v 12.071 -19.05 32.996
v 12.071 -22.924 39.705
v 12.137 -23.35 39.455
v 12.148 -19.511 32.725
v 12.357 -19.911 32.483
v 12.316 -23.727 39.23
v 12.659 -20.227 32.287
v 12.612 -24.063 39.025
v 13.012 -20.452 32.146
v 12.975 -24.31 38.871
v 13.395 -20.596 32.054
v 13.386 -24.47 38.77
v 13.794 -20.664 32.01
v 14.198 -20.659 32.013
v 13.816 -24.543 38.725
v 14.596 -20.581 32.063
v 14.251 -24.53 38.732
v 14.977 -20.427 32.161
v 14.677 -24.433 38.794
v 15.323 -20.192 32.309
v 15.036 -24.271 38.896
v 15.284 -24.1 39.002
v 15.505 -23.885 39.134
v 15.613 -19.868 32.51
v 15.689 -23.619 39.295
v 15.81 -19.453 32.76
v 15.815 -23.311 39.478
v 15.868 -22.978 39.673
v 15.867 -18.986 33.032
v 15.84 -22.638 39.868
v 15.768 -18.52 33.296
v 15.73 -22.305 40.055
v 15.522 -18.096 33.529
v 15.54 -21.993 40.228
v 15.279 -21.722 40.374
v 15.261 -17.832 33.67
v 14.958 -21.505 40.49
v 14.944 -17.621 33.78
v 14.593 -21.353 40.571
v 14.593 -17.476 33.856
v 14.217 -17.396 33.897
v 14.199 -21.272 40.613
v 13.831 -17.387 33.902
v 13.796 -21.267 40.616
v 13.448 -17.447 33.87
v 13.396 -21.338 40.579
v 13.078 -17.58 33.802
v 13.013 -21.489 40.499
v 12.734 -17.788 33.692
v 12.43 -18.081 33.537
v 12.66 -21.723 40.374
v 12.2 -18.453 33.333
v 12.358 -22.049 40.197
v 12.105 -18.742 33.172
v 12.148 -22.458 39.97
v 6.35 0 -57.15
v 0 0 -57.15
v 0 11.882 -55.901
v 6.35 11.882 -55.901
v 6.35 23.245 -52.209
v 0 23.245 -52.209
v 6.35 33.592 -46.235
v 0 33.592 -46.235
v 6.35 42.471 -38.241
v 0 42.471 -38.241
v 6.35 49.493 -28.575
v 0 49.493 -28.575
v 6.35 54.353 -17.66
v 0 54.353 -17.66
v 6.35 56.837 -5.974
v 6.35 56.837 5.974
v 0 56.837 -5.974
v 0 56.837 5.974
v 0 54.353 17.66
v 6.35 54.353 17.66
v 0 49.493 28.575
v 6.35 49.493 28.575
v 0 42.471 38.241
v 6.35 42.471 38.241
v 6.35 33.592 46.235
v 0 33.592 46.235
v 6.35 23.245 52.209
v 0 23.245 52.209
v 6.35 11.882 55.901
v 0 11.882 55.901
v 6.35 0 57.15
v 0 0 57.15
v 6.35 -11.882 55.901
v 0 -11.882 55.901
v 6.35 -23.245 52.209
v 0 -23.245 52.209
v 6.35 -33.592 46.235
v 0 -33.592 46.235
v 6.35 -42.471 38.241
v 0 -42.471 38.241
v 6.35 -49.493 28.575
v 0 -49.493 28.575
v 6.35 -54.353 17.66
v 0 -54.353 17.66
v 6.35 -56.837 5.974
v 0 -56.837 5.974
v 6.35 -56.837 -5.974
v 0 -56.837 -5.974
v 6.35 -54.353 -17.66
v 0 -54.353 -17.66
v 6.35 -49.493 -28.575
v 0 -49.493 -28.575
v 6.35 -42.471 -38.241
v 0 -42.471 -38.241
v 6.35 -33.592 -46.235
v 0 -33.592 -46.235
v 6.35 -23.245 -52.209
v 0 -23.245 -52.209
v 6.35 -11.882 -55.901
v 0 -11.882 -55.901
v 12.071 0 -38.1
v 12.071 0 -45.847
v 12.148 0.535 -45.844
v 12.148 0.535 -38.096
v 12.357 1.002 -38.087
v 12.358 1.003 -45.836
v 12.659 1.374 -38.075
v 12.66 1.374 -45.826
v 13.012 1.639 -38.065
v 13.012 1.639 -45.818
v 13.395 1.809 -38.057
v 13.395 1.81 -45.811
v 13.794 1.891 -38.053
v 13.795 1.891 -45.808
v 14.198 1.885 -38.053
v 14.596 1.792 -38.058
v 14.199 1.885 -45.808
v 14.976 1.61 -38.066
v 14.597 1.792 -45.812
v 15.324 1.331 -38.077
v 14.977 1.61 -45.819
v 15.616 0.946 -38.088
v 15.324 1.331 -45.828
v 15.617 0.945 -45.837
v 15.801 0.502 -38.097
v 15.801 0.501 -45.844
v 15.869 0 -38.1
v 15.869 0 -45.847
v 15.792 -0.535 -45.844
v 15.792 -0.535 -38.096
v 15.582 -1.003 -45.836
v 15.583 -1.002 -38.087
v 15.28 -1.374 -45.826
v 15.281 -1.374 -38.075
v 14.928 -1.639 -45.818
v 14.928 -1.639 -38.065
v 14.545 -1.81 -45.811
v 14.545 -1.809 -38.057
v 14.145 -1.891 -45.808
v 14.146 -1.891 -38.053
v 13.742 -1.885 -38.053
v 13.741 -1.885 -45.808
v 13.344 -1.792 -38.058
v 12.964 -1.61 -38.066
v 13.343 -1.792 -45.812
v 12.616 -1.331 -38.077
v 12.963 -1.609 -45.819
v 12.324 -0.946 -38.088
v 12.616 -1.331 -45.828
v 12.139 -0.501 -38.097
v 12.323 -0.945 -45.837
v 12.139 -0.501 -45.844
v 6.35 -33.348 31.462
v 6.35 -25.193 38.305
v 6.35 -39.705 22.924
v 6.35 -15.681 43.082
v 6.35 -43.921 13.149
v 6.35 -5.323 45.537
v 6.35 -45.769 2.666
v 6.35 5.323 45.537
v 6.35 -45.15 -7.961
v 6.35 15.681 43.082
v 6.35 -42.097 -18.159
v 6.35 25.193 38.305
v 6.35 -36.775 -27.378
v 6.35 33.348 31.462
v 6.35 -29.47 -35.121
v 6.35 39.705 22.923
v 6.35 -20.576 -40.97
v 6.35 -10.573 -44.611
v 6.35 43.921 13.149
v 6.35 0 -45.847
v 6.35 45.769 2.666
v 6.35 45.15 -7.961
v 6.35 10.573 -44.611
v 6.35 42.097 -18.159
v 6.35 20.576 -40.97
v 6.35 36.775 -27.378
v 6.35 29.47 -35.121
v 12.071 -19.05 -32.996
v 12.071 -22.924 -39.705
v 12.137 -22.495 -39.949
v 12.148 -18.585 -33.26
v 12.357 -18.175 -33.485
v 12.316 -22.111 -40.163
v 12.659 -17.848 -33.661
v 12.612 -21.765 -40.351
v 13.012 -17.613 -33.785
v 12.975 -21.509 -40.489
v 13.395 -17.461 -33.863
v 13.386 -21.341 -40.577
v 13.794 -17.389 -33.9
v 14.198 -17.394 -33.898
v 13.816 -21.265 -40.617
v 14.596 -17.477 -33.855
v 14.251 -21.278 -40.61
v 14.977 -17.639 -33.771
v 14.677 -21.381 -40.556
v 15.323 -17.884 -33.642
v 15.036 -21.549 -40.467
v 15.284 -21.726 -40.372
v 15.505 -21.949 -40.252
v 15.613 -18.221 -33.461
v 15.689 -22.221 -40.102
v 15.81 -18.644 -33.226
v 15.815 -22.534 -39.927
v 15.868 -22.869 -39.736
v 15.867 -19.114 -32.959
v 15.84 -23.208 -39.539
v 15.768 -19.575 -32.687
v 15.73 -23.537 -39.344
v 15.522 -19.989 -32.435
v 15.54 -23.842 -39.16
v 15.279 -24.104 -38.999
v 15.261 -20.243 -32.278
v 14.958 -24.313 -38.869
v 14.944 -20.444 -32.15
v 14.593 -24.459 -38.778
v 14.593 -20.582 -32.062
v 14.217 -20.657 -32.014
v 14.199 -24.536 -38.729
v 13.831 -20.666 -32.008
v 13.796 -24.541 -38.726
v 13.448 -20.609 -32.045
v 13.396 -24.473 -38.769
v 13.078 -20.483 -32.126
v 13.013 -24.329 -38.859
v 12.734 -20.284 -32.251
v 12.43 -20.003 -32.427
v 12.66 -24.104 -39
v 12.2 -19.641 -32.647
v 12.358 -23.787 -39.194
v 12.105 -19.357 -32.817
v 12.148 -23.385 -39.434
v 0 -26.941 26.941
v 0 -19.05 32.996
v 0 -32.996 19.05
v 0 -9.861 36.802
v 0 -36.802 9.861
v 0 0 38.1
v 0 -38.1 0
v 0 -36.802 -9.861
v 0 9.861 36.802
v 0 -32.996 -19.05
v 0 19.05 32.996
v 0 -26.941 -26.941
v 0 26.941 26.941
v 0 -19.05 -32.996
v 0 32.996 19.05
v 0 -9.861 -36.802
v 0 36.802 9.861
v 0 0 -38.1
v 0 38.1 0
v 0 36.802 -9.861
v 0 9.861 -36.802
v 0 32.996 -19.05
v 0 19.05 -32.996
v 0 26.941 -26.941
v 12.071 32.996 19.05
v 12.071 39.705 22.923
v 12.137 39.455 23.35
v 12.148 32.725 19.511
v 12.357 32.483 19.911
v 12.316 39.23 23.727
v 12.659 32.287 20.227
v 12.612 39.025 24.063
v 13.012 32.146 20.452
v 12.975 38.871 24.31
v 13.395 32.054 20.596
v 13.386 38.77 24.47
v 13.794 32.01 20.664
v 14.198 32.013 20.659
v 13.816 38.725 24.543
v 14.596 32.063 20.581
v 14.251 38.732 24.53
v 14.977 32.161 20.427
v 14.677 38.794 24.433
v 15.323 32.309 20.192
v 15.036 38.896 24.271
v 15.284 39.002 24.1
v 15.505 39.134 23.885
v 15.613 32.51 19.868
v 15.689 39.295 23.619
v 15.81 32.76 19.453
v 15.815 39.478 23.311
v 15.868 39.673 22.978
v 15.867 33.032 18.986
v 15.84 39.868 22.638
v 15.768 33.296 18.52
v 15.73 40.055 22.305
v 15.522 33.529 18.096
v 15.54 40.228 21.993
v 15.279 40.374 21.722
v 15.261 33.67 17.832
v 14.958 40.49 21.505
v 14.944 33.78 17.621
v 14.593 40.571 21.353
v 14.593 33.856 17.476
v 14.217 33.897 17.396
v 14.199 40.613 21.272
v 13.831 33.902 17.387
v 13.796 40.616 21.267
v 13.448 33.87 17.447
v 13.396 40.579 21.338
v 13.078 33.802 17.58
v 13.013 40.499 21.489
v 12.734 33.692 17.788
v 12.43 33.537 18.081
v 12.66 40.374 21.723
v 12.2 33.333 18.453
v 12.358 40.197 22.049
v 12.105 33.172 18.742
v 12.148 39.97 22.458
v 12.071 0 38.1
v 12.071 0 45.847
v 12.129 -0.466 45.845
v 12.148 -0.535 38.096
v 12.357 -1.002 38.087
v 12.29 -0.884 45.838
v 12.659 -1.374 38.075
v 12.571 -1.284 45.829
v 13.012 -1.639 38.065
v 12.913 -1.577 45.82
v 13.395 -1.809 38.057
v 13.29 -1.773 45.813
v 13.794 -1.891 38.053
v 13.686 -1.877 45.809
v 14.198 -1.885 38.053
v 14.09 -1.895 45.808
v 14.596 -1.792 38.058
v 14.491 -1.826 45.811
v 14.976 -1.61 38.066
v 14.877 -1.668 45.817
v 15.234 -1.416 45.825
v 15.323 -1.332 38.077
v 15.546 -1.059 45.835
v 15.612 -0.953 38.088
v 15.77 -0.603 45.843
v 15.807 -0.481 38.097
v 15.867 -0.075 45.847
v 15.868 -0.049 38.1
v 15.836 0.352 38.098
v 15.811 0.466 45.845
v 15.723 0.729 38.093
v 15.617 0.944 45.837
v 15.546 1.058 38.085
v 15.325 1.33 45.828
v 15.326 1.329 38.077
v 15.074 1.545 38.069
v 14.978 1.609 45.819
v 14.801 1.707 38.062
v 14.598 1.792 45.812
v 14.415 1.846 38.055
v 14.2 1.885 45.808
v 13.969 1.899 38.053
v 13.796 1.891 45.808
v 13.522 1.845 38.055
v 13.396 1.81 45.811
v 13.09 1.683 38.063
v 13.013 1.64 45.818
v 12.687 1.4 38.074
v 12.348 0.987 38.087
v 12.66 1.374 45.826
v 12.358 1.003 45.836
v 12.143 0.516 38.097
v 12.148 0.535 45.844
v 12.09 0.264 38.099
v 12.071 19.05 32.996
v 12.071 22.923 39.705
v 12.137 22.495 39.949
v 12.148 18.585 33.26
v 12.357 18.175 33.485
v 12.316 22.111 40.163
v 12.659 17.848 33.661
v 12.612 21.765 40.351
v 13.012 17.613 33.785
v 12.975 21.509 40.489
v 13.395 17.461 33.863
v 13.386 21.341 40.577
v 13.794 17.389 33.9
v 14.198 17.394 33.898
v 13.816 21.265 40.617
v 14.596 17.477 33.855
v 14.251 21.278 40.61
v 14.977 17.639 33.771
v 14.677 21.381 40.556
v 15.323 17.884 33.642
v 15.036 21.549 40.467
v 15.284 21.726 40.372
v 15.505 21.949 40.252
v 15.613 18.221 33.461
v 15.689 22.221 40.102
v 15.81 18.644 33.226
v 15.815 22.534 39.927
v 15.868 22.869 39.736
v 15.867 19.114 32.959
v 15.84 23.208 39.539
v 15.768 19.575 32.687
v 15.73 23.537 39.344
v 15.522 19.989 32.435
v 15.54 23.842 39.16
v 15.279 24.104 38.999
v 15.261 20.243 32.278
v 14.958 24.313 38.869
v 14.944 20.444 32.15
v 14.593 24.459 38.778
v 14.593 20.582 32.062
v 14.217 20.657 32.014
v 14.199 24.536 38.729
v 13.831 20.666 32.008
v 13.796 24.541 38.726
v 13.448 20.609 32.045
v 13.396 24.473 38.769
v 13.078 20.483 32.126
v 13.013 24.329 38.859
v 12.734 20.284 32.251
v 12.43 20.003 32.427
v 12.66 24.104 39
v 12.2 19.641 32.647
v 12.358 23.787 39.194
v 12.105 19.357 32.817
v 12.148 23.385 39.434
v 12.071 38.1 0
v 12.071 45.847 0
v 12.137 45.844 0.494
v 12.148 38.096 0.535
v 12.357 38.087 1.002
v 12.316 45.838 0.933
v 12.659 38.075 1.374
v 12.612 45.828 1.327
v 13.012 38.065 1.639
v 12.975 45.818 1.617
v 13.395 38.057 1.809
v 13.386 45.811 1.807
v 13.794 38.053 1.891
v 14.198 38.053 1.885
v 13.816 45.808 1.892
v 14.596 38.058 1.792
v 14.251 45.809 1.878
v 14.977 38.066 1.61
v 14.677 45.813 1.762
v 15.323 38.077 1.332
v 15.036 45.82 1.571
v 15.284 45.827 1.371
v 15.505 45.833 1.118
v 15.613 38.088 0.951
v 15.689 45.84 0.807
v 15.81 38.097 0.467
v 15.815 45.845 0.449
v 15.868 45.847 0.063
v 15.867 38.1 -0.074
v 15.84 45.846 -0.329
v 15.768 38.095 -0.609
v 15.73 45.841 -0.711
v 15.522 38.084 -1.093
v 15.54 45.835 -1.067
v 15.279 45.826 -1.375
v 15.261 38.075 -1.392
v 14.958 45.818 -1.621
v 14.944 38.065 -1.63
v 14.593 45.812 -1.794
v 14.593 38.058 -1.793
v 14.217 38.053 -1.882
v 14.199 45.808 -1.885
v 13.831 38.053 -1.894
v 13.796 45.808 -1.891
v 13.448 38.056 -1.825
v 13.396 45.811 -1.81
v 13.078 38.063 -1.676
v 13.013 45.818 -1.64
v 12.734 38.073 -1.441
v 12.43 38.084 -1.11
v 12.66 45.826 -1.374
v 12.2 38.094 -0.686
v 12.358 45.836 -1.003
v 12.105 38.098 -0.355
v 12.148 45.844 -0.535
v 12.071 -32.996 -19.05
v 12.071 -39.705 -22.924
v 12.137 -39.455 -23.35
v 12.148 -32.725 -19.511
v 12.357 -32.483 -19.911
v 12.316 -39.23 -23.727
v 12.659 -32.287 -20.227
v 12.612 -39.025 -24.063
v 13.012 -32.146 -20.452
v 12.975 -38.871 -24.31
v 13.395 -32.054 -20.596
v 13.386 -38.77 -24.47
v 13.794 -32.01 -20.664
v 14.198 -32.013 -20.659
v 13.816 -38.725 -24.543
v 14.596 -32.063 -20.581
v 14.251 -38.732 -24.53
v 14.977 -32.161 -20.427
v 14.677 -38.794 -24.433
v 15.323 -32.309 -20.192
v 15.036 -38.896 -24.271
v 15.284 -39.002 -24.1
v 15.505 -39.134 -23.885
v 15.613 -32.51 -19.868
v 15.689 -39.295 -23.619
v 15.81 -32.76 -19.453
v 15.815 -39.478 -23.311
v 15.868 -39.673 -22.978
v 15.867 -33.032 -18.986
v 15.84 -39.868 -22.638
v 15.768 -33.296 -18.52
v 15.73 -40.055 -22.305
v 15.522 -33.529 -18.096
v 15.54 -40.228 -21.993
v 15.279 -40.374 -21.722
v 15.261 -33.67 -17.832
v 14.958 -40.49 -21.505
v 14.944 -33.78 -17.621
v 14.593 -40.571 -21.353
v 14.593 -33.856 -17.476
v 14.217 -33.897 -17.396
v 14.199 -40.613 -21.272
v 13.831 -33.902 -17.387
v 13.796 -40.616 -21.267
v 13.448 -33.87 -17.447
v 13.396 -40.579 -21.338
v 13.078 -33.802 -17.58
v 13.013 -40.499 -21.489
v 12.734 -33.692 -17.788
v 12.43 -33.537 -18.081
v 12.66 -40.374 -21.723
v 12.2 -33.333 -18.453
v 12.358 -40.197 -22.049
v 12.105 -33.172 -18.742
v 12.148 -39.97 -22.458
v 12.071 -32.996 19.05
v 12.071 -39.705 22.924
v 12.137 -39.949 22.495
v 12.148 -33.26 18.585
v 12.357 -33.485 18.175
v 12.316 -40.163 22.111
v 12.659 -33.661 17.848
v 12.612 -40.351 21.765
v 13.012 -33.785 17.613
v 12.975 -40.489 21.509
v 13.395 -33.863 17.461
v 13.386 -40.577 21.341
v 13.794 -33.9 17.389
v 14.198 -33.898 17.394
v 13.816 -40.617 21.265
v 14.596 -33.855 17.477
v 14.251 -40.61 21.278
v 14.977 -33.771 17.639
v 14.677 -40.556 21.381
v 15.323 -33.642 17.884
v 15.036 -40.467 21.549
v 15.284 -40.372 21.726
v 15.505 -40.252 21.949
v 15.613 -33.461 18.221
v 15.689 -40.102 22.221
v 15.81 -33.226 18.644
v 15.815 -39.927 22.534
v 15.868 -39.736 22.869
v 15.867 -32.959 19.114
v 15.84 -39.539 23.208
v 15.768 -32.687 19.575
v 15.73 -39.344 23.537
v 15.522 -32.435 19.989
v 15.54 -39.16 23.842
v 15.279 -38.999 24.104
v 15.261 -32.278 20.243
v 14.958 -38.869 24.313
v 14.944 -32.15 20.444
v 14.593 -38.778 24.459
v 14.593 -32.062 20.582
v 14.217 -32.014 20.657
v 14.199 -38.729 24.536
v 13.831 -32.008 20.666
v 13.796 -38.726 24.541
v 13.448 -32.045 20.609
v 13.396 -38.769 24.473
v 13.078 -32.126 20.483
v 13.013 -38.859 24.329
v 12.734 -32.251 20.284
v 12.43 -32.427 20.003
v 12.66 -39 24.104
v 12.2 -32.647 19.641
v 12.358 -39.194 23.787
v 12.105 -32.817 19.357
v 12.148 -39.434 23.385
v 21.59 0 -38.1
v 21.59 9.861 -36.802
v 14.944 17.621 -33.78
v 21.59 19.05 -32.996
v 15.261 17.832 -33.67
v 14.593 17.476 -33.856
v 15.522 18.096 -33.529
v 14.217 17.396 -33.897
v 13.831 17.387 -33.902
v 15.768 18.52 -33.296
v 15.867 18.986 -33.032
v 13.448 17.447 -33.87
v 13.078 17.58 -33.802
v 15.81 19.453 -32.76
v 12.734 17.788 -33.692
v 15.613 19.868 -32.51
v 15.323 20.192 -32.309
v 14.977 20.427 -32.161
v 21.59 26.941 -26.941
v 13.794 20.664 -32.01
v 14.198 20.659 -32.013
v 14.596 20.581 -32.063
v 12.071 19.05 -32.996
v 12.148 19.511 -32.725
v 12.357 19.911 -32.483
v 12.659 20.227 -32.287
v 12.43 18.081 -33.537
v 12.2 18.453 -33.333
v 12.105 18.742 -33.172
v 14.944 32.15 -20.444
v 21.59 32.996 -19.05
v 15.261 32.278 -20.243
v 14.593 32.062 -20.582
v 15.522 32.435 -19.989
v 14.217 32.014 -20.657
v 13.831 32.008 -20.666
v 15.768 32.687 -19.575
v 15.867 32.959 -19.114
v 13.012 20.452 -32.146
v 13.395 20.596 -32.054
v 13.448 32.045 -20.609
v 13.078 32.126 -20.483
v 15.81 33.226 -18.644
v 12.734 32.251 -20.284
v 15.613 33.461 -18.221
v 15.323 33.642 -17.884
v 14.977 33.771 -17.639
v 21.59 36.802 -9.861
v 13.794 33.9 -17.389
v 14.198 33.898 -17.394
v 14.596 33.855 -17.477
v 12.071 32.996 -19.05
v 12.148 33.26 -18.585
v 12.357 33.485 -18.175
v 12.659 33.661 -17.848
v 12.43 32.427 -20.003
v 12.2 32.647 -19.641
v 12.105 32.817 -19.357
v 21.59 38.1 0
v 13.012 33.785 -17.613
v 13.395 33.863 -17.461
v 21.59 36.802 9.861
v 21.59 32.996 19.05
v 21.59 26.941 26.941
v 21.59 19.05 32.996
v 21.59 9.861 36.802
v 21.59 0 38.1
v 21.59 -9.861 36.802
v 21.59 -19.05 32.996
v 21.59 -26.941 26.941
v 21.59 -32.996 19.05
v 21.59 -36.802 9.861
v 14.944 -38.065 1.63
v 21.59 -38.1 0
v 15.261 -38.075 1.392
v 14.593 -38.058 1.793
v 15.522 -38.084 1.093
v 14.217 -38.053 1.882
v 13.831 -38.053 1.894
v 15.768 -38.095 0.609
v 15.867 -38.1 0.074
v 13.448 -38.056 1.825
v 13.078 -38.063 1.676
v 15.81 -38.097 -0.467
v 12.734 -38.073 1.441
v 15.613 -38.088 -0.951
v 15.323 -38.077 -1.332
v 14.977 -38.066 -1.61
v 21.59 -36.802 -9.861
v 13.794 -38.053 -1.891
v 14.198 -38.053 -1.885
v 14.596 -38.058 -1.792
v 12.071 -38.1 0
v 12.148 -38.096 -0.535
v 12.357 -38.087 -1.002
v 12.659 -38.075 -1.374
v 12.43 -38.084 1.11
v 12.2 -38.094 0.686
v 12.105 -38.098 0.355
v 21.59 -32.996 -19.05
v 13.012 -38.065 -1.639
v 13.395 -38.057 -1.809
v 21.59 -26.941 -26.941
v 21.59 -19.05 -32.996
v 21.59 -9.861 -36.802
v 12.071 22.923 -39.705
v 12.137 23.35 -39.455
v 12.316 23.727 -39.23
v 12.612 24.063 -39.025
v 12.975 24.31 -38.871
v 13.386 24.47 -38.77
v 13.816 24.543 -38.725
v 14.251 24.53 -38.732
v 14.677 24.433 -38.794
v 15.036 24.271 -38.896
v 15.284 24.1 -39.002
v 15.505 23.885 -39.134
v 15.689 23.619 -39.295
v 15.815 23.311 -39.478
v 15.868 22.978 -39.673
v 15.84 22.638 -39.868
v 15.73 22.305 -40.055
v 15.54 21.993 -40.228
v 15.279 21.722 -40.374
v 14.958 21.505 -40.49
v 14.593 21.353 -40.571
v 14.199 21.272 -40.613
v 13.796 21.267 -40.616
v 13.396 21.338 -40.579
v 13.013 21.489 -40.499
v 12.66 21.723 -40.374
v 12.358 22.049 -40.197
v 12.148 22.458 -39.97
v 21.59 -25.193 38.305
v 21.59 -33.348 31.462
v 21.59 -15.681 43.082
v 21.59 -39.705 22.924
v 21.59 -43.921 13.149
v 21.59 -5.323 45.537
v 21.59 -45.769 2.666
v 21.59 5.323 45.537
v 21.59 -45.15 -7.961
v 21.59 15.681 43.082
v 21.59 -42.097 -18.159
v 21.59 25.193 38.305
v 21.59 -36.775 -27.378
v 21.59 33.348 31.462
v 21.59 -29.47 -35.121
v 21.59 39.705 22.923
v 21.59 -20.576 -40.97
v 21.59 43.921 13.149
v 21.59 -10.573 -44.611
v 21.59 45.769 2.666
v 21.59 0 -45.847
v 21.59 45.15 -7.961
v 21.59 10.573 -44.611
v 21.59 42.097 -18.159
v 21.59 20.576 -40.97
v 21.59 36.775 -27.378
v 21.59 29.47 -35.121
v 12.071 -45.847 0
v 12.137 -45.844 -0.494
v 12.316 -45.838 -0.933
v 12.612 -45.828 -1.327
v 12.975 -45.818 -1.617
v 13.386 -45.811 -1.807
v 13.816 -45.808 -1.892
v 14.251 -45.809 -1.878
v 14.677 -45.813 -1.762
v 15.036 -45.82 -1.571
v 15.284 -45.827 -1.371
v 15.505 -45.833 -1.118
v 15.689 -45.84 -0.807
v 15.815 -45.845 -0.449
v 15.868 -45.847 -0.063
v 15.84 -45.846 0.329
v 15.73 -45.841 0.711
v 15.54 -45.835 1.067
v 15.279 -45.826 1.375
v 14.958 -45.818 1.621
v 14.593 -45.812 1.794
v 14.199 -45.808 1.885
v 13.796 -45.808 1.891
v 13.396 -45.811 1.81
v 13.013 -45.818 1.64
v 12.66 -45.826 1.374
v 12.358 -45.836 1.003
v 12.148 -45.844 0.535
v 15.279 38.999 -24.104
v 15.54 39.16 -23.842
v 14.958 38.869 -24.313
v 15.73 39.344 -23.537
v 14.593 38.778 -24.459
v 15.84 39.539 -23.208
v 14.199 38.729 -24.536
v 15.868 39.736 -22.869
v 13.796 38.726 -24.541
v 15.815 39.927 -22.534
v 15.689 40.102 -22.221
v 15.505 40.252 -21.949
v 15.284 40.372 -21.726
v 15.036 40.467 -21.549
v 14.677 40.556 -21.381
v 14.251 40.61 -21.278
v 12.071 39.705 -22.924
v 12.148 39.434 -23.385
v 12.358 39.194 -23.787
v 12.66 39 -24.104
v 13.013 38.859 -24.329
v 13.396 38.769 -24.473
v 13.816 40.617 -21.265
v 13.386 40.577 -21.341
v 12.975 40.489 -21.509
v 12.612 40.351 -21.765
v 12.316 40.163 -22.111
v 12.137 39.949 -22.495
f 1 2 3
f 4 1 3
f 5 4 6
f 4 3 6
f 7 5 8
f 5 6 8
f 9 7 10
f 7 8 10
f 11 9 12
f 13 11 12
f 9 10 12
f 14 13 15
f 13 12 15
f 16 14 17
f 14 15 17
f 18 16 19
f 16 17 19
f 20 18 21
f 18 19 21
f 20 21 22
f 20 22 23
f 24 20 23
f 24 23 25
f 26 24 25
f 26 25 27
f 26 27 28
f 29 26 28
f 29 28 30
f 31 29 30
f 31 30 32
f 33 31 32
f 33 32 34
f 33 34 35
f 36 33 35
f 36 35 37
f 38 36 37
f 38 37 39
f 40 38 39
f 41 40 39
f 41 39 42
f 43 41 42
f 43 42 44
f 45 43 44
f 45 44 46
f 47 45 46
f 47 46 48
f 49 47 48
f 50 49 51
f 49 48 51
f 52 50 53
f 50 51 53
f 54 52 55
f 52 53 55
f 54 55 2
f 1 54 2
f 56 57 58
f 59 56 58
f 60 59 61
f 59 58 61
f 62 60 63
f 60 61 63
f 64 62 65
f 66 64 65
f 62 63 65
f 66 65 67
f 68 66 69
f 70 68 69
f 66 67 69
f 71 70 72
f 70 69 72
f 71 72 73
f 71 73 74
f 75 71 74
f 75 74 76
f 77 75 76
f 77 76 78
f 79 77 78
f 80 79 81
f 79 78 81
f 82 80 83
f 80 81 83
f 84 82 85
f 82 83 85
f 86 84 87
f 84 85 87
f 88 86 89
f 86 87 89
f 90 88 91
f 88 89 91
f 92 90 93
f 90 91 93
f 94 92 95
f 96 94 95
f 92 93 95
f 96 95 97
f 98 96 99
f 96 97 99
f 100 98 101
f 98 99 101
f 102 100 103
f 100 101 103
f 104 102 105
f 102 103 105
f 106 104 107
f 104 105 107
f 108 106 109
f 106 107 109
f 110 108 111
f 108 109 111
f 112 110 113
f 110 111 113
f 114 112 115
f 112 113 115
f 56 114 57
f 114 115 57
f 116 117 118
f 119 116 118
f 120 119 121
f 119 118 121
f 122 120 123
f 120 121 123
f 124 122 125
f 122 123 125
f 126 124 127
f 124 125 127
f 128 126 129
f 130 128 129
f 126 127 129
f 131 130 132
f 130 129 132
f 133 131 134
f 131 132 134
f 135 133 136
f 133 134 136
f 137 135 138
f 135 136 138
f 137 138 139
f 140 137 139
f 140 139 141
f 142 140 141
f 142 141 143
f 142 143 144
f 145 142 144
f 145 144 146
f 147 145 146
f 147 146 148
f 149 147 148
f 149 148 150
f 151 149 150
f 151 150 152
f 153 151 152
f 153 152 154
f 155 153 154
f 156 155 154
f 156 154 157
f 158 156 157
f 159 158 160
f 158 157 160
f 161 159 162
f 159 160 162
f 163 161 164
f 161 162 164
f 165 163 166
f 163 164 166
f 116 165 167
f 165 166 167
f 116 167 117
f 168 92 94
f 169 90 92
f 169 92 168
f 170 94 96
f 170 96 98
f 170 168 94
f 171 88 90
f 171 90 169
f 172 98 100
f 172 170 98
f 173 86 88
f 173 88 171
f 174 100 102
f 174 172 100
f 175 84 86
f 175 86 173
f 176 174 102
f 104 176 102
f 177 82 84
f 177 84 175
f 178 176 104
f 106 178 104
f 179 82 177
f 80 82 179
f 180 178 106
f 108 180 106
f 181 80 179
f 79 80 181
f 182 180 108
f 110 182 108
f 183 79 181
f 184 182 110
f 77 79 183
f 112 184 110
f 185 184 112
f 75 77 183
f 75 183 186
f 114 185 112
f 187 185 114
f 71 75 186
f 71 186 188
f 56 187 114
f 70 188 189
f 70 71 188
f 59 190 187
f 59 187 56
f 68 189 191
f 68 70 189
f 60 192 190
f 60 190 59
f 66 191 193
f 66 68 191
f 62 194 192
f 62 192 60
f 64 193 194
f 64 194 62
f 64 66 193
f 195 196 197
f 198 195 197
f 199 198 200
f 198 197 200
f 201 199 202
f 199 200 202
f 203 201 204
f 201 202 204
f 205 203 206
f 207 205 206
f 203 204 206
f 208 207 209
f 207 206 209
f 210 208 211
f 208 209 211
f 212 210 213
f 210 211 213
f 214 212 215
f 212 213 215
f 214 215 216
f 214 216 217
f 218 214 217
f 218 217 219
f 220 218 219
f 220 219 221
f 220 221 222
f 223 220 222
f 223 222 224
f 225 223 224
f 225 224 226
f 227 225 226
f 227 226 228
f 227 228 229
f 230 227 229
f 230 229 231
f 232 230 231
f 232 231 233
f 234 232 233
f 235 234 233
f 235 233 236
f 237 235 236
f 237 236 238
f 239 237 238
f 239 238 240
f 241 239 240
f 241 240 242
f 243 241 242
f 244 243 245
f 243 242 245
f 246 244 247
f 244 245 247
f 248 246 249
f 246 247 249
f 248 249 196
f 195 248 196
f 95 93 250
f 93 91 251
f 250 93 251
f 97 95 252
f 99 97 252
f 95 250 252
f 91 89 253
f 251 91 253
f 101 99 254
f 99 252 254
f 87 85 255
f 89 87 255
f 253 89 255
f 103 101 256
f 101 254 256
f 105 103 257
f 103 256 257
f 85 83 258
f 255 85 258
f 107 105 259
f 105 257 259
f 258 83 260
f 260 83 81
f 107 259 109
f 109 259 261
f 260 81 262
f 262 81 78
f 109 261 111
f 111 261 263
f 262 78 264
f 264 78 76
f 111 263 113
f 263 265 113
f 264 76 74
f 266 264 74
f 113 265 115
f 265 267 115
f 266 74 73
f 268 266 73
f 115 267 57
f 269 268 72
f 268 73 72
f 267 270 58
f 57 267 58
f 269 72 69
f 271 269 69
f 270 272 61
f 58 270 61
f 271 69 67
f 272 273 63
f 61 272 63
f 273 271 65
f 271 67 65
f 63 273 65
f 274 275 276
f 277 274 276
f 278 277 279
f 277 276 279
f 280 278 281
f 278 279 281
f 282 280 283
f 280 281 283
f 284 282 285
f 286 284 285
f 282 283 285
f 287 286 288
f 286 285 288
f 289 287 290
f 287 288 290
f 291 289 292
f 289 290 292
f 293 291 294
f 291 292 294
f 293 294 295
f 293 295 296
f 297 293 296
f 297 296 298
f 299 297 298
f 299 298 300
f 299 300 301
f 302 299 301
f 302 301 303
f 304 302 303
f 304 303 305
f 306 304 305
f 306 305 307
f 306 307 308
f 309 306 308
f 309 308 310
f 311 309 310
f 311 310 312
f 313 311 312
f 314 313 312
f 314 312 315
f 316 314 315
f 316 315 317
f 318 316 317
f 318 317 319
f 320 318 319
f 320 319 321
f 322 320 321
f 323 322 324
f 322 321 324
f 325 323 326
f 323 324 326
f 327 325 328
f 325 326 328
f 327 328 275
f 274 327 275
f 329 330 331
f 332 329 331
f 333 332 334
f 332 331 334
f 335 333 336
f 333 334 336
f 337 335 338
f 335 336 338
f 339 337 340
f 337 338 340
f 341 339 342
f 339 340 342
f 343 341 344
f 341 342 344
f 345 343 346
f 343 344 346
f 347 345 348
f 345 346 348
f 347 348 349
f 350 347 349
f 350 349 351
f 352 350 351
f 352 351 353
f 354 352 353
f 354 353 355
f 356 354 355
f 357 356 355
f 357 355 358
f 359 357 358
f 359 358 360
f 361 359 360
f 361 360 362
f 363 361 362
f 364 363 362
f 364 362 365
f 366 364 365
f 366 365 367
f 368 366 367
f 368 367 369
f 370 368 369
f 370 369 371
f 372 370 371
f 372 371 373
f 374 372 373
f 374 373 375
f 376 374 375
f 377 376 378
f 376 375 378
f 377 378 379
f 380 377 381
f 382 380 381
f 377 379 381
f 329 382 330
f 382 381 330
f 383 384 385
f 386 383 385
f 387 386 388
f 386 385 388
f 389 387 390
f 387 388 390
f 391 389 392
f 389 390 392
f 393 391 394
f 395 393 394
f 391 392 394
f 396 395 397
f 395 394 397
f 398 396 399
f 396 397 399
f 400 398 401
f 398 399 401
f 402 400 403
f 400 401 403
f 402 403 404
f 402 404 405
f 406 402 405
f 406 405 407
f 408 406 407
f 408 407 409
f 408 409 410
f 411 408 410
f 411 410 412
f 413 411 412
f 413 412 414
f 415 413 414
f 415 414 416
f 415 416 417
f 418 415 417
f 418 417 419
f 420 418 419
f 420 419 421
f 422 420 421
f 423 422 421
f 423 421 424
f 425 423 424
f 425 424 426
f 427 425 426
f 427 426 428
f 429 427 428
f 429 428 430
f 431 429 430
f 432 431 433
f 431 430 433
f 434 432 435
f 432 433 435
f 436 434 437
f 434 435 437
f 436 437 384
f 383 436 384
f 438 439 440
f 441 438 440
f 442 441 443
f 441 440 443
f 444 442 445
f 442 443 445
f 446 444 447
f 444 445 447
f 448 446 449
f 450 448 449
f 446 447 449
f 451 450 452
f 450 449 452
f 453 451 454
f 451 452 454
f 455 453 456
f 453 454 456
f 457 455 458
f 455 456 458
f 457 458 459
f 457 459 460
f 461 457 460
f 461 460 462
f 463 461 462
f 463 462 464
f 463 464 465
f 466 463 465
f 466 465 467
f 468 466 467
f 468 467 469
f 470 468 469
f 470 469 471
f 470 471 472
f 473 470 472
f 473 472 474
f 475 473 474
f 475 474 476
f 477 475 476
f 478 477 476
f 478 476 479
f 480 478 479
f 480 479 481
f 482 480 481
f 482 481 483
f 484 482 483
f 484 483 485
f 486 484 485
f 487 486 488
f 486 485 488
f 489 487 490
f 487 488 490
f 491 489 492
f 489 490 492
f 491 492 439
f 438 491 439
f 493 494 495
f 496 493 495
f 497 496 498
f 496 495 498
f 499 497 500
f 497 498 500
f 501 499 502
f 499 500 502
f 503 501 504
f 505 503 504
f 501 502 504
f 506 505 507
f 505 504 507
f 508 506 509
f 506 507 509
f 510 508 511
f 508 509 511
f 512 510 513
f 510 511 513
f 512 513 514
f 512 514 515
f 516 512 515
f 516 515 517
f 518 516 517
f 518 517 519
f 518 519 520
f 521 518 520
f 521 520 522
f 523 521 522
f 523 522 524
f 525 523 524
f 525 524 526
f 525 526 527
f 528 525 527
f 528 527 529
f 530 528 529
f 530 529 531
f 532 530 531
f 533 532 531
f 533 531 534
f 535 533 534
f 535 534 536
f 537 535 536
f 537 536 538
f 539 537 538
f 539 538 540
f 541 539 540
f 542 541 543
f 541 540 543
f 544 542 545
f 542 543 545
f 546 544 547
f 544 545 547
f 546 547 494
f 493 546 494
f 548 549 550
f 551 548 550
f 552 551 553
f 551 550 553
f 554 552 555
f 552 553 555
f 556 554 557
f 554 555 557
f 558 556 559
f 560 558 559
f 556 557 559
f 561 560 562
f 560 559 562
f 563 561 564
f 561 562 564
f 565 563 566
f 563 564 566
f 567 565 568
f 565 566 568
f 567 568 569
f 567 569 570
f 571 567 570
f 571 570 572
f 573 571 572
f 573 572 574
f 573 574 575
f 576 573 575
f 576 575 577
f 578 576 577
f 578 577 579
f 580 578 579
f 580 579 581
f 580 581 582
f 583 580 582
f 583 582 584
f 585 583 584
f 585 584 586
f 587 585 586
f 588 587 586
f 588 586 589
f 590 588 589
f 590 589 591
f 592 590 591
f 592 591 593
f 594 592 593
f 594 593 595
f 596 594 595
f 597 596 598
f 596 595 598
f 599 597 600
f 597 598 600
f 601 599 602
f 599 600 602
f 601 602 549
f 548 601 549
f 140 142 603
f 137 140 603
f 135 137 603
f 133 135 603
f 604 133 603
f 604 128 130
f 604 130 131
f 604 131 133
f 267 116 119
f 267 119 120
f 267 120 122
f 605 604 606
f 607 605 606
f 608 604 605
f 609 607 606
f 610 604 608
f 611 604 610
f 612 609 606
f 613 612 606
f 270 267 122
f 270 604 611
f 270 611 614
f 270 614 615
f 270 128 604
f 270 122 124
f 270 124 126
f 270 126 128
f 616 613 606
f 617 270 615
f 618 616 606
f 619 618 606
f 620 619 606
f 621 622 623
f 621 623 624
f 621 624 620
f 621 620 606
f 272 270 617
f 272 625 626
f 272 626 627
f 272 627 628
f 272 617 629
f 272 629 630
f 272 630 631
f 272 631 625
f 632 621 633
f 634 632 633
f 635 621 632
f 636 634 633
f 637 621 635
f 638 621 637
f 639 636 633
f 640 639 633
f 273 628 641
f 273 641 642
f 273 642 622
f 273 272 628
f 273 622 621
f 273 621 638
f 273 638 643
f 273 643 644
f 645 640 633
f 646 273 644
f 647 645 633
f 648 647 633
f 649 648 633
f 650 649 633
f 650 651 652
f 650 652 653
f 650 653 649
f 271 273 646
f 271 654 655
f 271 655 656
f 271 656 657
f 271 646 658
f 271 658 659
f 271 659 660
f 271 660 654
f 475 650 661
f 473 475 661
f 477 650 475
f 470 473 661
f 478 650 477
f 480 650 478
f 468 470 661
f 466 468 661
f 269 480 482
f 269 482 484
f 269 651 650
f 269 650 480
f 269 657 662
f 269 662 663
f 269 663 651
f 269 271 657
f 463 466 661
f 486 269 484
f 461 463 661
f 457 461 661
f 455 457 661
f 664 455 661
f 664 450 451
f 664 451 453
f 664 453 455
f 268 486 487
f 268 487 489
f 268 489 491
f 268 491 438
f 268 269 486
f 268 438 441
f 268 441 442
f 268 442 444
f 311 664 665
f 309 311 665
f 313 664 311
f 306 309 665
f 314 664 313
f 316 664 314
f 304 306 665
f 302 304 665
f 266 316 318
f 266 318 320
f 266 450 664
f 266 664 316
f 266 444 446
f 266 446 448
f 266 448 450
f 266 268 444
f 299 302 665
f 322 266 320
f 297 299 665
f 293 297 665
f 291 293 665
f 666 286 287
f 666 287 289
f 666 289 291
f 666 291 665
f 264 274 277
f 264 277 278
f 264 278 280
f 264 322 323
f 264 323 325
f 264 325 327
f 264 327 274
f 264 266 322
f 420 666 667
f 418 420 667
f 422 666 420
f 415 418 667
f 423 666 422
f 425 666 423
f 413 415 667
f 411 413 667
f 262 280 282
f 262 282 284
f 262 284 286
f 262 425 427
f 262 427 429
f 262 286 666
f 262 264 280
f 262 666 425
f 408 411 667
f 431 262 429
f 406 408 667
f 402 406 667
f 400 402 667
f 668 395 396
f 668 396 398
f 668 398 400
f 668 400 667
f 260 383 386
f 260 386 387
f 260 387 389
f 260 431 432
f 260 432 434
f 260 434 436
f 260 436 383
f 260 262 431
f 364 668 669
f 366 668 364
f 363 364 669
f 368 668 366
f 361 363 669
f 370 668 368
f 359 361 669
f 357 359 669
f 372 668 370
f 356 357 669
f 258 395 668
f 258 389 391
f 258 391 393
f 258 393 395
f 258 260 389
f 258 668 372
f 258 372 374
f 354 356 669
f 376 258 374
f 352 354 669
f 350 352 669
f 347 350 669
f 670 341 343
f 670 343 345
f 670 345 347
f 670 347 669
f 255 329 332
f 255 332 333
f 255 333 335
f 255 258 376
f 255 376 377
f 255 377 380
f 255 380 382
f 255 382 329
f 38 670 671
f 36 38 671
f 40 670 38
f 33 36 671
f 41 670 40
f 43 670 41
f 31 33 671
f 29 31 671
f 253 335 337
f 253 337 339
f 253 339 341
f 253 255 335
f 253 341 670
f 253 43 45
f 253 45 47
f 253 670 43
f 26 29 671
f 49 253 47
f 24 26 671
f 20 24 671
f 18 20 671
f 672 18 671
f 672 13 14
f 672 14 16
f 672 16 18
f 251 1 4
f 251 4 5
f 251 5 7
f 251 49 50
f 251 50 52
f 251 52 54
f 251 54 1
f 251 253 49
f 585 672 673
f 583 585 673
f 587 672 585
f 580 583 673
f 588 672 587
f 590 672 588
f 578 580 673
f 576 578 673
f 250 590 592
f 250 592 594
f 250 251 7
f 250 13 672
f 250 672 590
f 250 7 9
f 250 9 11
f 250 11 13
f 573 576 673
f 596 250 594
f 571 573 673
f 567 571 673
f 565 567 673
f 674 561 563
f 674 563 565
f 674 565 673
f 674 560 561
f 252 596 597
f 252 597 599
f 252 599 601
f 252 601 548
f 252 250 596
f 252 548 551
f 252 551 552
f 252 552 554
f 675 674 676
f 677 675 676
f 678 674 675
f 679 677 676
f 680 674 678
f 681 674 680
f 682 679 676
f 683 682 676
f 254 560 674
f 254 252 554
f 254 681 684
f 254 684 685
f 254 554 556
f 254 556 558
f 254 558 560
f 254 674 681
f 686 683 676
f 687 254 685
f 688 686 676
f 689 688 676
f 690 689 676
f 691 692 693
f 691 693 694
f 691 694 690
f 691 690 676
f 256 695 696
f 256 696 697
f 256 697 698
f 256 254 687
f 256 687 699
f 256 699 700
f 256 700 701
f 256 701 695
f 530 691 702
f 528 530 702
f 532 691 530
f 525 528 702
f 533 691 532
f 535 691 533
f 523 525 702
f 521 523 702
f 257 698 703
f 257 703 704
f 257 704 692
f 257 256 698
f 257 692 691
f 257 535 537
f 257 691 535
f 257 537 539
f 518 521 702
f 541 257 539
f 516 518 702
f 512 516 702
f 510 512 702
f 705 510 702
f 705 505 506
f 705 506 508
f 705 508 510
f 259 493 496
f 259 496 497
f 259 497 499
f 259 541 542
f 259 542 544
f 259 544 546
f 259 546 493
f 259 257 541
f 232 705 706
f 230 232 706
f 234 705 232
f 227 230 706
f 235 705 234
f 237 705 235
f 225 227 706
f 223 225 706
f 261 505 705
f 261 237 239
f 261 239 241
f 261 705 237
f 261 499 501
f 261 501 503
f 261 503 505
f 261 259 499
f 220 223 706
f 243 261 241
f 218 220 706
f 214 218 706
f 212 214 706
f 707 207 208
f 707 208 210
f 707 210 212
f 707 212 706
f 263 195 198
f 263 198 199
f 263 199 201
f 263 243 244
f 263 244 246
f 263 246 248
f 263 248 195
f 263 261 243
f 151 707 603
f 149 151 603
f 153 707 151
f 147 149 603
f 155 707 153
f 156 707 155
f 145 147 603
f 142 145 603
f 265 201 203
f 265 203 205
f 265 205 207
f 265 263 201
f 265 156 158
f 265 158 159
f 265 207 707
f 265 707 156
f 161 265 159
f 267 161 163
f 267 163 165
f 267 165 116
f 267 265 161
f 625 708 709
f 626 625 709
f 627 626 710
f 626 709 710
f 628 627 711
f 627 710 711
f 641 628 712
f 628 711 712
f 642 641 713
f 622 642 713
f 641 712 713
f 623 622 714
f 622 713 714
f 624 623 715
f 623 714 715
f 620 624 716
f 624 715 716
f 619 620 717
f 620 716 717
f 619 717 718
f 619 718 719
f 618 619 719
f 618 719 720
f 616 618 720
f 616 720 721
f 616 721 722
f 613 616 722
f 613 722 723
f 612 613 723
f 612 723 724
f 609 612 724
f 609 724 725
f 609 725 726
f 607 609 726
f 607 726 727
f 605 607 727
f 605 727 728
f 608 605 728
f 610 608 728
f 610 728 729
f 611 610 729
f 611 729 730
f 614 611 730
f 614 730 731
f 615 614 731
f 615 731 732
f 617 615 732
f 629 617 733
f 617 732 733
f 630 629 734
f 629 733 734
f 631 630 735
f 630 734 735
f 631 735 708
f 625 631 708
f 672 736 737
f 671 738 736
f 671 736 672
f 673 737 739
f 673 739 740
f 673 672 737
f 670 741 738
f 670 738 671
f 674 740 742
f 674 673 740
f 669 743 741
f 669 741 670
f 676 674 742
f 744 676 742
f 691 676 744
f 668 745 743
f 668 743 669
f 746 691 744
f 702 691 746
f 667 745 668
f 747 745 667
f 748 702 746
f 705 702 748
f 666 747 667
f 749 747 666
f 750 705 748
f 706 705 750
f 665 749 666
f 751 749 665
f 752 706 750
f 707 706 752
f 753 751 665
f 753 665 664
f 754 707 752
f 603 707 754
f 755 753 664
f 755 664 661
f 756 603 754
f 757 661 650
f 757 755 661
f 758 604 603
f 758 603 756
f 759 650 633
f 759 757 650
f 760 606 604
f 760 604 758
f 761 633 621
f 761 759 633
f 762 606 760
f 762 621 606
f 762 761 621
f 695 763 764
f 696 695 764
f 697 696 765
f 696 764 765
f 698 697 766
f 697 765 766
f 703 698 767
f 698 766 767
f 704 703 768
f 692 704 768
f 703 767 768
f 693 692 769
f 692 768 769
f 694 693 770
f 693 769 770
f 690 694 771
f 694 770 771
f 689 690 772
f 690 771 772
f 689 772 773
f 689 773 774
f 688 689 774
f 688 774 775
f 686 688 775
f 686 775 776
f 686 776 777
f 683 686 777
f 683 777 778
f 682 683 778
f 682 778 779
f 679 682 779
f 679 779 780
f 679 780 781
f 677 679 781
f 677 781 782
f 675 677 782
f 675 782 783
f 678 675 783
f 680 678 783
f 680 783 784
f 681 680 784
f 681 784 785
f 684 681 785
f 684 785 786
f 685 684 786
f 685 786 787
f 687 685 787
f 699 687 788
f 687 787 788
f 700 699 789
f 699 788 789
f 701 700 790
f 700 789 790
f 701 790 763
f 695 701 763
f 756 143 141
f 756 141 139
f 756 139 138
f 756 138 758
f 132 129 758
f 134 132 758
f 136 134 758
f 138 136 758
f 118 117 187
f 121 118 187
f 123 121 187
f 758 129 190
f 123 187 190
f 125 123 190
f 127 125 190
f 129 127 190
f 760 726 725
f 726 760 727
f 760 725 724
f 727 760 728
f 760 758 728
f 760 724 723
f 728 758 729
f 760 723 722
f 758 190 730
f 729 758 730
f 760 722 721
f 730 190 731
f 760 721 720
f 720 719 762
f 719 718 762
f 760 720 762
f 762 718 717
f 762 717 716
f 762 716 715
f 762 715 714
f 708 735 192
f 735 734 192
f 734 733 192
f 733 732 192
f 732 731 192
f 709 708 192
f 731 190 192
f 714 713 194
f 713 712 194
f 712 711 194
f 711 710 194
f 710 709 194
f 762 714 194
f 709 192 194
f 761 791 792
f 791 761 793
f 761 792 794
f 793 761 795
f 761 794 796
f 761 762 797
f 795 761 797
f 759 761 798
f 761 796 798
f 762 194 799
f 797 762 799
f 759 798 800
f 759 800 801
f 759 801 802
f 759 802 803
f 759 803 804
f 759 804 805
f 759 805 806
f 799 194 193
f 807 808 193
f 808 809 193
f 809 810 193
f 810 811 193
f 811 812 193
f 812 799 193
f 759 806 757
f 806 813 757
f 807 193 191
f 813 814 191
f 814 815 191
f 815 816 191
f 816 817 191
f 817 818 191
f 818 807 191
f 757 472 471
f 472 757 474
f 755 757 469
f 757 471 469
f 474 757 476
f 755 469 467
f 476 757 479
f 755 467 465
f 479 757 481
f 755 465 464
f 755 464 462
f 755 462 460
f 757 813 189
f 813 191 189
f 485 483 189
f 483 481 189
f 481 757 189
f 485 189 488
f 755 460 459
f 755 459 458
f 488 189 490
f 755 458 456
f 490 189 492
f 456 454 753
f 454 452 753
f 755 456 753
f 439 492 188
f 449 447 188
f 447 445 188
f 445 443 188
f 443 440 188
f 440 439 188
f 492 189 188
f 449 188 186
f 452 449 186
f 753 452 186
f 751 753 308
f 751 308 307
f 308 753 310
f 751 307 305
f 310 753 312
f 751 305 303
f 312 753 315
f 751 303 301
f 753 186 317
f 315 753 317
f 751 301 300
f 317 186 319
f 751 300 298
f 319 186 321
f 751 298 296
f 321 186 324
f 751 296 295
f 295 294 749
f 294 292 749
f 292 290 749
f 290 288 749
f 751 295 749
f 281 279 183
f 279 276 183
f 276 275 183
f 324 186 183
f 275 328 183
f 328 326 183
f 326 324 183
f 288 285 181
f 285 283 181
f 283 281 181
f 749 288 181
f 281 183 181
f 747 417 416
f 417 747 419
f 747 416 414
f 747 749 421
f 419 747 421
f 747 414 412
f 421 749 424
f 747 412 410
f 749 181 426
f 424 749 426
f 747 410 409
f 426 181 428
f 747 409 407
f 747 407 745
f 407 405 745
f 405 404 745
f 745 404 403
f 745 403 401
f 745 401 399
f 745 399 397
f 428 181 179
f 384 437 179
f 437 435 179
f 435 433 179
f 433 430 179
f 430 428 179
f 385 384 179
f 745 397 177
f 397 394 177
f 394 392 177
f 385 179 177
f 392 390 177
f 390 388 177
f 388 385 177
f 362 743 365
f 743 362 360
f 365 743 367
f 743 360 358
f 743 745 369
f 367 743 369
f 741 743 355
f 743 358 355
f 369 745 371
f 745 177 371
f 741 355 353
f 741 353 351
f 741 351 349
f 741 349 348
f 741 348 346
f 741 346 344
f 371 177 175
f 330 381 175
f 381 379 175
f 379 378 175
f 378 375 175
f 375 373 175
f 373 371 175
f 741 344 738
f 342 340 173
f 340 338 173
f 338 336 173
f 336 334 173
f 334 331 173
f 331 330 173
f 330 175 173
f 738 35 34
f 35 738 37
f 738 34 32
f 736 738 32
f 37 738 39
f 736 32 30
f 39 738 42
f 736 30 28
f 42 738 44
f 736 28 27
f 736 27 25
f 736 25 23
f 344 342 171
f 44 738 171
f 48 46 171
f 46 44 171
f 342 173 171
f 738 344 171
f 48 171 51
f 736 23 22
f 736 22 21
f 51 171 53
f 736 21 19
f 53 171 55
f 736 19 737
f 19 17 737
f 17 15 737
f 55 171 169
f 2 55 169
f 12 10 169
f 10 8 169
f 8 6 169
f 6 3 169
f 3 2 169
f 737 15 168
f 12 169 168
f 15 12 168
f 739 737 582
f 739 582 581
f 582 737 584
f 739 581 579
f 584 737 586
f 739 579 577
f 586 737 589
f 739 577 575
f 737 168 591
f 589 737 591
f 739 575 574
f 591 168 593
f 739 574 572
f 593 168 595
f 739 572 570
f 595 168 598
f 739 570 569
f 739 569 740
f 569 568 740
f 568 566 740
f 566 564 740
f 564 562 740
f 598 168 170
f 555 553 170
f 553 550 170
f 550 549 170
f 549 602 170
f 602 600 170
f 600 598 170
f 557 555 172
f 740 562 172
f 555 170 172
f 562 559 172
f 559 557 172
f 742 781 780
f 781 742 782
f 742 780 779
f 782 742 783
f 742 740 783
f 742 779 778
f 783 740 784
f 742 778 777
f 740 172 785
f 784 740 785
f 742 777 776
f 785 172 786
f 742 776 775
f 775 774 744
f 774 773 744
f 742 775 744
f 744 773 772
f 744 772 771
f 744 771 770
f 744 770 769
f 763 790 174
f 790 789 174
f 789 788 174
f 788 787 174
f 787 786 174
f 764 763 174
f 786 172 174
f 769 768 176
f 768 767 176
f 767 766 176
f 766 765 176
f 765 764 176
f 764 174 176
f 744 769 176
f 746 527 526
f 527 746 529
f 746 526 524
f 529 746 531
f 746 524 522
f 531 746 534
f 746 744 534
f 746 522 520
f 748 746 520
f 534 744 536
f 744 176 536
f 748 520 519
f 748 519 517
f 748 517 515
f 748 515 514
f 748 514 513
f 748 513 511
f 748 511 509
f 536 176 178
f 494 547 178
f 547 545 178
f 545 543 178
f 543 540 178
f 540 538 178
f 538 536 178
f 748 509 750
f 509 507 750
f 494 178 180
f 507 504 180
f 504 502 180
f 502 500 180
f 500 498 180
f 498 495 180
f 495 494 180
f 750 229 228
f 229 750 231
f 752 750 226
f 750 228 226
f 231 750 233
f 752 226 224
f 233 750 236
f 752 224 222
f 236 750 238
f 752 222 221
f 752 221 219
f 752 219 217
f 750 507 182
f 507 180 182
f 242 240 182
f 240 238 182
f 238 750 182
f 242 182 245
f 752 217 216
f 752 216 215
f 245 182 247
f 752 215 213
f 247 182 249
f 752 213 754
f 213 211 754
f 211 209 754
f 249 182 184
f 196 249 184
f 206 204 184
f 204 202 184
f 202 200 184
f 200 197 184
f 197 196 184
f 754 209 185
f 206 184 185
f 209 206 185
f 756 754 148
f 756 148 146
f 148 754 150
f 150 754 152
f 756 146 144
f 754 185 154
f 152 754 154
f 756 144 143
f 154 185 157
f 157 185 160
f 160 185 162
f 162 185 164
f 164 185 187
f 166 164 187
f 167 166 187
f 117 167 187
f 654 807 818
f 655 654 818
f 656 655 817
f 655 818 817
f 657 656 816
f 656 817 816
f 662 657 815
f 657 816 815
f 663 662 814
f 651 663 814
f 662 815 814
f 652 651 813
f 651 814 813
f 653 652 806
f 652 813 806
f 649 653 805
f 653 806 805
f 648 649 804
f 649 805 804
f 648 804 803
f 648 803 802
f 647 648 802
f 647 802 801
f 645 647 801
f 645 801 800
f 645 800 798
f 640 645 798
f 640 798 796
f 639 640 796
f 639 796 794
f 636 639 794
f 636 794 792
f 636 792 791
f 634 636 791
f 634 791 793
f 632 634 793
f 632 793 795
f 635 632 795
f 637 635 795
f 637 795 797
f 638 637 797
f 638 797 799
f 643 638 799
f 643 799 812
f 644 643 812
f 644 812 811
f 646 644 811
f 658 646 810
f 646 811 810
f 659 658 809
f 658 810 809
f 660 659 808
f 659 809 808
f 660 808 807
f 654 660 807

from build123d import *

# Parameters (mm, degrees)
SKETCH1_R           = 57.15
SKETCH1_R_2         = 38.1
BOSS_EXTRUDE1_DEPTH = 6.35
SKETCH2_R           = 45.847
SKETCH2_R_2         = 38.1
BOSS_EXTRUDE2_DEPTH = 15.24
SKETCH4_R           = 1.89865
CUT_EXTRUDE1_DEPTH  = 11.43
CIRPATTERN1_COUNT   = 12


with BuildPart() as part:
    # Sketch1 → Boss-Extrude1 (new body)
    with BuildSketch(Plane(origin=(0, 0, 0), x_dir=(0, 0, -1), z_dir=(1, 0, 0))):
        Circle(SKETCH1_R)
        Circle(SKETCH1_R_2, mode=Mode.SUBTRACT)
    extrude(amount=BOSS_EXTRUDE1_DEPTH)

    # Sketch2 → Boss-Extrude2 (add)
    with BuildSketch(Plane(origin=(6.35, 0, 0), x_dir=(0, 0, -1), z_dir=(1, 0, 0))):
        Circle(SKETCH2_R)
        Circle(SKETCH2_R_2, mode=Mode.SUBTRACT)
    extrude(amount=BOSS_EXTRUDE2_DEPTH)

    # Sketch4 → Cut-Extrude1 (cut)
    with BuildSketch(Plane(origin=(0, 0, -45.847), x_dir=(-1, 0, 0), z_dir=(0, 0, -1))):
        with Locations((-13.97, 0)):
            Circle(SKETCH4_R)
    cut_extrude1 = extrude(amount=-CUT_EXTRUDE1_DEPTH, mode=Mode.SUBTRACT)

    # CirPattern1: Cut-Extrude1 ×12 about axis
    cirpattern1_axis = Axis((0, 0, 0), (1, 0, 0))
    for i in range(1, CIRPATTERN1_COUNT):
        add(cut_extrude1.rotate(cirpattern1_axis, i * 360 / CIRPATTERN1_COUNT), mode=Mode.SUBTRACT)


solid = part.part
